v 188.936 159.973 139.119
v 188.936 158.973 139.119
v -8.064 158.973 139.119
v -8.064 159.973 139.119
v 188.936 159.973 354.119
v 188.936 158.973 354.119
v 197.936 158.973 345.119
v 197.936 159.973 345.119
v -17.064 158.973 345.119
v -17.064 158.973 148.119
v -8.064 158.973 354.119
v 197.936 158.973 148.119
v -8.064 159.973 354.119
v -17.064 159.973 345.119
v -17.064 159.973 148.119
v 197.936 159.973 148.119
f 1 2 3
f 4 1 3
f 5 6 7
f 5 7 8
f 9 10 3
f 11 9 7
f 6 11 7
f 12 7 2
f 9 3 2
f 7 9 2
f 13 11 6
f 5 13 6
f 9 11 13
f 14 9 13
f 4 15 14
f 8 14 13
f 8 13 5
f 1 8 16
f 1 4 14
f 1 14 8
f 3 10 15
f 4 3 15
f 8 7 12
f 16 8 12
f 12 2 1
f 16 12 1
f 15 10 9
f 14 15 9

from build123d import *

# Parameters (mm, degrees)
BOSS_EXTRUDE1_DEPTH = 1
CHAMFER2_SIZE       = 9


with BuildPart() as part:
    # Sketch1 → Boss-Extrude1 (new body)
    with BuildSketch(Plane(origin=(0, 158.973467121, 0), x_dir=(1, 0, 0), z_dir=(0, 1, 0))):
        Polygon((127.936218841, -354.11857787), (191.936218841, -354.11857787), (197.936218841, -354.11857787), (197.936218841, -348.11857787), (197.936218841, -145.11857787), (197.936218841, -139.11857787), (191.936218841, -139.11857787), (-11.063781159, -139.11857787), (-17.063781159, -139.11857787), (-17.063781159, -145.11857787), (-17.063781159, -348.11857787), (-17.063781159, -354.11857787), (-11.063781159, -354.11857787), (52.936218841, -354.11857787), align=None)
    extrude(amount=BOSS_EXTRUDE1_DEPTH)

    # Chamfer2
    chamfer2_edges = [part.edges().sort_by_distance(p)[0] for p in [
        (-17.063781159, 159.473467121, 354.11857787),
        (-17.063781159, 159.473467121, 139.11857787),
        (197.936218841, 159.473467121, 139.11857787),
        (197.936218841, 159.473467121, 354.11857787),
    ]]
    chamfer(chamfer2_edges, length=CHAMFER2_SIZE)


solid = part.part
